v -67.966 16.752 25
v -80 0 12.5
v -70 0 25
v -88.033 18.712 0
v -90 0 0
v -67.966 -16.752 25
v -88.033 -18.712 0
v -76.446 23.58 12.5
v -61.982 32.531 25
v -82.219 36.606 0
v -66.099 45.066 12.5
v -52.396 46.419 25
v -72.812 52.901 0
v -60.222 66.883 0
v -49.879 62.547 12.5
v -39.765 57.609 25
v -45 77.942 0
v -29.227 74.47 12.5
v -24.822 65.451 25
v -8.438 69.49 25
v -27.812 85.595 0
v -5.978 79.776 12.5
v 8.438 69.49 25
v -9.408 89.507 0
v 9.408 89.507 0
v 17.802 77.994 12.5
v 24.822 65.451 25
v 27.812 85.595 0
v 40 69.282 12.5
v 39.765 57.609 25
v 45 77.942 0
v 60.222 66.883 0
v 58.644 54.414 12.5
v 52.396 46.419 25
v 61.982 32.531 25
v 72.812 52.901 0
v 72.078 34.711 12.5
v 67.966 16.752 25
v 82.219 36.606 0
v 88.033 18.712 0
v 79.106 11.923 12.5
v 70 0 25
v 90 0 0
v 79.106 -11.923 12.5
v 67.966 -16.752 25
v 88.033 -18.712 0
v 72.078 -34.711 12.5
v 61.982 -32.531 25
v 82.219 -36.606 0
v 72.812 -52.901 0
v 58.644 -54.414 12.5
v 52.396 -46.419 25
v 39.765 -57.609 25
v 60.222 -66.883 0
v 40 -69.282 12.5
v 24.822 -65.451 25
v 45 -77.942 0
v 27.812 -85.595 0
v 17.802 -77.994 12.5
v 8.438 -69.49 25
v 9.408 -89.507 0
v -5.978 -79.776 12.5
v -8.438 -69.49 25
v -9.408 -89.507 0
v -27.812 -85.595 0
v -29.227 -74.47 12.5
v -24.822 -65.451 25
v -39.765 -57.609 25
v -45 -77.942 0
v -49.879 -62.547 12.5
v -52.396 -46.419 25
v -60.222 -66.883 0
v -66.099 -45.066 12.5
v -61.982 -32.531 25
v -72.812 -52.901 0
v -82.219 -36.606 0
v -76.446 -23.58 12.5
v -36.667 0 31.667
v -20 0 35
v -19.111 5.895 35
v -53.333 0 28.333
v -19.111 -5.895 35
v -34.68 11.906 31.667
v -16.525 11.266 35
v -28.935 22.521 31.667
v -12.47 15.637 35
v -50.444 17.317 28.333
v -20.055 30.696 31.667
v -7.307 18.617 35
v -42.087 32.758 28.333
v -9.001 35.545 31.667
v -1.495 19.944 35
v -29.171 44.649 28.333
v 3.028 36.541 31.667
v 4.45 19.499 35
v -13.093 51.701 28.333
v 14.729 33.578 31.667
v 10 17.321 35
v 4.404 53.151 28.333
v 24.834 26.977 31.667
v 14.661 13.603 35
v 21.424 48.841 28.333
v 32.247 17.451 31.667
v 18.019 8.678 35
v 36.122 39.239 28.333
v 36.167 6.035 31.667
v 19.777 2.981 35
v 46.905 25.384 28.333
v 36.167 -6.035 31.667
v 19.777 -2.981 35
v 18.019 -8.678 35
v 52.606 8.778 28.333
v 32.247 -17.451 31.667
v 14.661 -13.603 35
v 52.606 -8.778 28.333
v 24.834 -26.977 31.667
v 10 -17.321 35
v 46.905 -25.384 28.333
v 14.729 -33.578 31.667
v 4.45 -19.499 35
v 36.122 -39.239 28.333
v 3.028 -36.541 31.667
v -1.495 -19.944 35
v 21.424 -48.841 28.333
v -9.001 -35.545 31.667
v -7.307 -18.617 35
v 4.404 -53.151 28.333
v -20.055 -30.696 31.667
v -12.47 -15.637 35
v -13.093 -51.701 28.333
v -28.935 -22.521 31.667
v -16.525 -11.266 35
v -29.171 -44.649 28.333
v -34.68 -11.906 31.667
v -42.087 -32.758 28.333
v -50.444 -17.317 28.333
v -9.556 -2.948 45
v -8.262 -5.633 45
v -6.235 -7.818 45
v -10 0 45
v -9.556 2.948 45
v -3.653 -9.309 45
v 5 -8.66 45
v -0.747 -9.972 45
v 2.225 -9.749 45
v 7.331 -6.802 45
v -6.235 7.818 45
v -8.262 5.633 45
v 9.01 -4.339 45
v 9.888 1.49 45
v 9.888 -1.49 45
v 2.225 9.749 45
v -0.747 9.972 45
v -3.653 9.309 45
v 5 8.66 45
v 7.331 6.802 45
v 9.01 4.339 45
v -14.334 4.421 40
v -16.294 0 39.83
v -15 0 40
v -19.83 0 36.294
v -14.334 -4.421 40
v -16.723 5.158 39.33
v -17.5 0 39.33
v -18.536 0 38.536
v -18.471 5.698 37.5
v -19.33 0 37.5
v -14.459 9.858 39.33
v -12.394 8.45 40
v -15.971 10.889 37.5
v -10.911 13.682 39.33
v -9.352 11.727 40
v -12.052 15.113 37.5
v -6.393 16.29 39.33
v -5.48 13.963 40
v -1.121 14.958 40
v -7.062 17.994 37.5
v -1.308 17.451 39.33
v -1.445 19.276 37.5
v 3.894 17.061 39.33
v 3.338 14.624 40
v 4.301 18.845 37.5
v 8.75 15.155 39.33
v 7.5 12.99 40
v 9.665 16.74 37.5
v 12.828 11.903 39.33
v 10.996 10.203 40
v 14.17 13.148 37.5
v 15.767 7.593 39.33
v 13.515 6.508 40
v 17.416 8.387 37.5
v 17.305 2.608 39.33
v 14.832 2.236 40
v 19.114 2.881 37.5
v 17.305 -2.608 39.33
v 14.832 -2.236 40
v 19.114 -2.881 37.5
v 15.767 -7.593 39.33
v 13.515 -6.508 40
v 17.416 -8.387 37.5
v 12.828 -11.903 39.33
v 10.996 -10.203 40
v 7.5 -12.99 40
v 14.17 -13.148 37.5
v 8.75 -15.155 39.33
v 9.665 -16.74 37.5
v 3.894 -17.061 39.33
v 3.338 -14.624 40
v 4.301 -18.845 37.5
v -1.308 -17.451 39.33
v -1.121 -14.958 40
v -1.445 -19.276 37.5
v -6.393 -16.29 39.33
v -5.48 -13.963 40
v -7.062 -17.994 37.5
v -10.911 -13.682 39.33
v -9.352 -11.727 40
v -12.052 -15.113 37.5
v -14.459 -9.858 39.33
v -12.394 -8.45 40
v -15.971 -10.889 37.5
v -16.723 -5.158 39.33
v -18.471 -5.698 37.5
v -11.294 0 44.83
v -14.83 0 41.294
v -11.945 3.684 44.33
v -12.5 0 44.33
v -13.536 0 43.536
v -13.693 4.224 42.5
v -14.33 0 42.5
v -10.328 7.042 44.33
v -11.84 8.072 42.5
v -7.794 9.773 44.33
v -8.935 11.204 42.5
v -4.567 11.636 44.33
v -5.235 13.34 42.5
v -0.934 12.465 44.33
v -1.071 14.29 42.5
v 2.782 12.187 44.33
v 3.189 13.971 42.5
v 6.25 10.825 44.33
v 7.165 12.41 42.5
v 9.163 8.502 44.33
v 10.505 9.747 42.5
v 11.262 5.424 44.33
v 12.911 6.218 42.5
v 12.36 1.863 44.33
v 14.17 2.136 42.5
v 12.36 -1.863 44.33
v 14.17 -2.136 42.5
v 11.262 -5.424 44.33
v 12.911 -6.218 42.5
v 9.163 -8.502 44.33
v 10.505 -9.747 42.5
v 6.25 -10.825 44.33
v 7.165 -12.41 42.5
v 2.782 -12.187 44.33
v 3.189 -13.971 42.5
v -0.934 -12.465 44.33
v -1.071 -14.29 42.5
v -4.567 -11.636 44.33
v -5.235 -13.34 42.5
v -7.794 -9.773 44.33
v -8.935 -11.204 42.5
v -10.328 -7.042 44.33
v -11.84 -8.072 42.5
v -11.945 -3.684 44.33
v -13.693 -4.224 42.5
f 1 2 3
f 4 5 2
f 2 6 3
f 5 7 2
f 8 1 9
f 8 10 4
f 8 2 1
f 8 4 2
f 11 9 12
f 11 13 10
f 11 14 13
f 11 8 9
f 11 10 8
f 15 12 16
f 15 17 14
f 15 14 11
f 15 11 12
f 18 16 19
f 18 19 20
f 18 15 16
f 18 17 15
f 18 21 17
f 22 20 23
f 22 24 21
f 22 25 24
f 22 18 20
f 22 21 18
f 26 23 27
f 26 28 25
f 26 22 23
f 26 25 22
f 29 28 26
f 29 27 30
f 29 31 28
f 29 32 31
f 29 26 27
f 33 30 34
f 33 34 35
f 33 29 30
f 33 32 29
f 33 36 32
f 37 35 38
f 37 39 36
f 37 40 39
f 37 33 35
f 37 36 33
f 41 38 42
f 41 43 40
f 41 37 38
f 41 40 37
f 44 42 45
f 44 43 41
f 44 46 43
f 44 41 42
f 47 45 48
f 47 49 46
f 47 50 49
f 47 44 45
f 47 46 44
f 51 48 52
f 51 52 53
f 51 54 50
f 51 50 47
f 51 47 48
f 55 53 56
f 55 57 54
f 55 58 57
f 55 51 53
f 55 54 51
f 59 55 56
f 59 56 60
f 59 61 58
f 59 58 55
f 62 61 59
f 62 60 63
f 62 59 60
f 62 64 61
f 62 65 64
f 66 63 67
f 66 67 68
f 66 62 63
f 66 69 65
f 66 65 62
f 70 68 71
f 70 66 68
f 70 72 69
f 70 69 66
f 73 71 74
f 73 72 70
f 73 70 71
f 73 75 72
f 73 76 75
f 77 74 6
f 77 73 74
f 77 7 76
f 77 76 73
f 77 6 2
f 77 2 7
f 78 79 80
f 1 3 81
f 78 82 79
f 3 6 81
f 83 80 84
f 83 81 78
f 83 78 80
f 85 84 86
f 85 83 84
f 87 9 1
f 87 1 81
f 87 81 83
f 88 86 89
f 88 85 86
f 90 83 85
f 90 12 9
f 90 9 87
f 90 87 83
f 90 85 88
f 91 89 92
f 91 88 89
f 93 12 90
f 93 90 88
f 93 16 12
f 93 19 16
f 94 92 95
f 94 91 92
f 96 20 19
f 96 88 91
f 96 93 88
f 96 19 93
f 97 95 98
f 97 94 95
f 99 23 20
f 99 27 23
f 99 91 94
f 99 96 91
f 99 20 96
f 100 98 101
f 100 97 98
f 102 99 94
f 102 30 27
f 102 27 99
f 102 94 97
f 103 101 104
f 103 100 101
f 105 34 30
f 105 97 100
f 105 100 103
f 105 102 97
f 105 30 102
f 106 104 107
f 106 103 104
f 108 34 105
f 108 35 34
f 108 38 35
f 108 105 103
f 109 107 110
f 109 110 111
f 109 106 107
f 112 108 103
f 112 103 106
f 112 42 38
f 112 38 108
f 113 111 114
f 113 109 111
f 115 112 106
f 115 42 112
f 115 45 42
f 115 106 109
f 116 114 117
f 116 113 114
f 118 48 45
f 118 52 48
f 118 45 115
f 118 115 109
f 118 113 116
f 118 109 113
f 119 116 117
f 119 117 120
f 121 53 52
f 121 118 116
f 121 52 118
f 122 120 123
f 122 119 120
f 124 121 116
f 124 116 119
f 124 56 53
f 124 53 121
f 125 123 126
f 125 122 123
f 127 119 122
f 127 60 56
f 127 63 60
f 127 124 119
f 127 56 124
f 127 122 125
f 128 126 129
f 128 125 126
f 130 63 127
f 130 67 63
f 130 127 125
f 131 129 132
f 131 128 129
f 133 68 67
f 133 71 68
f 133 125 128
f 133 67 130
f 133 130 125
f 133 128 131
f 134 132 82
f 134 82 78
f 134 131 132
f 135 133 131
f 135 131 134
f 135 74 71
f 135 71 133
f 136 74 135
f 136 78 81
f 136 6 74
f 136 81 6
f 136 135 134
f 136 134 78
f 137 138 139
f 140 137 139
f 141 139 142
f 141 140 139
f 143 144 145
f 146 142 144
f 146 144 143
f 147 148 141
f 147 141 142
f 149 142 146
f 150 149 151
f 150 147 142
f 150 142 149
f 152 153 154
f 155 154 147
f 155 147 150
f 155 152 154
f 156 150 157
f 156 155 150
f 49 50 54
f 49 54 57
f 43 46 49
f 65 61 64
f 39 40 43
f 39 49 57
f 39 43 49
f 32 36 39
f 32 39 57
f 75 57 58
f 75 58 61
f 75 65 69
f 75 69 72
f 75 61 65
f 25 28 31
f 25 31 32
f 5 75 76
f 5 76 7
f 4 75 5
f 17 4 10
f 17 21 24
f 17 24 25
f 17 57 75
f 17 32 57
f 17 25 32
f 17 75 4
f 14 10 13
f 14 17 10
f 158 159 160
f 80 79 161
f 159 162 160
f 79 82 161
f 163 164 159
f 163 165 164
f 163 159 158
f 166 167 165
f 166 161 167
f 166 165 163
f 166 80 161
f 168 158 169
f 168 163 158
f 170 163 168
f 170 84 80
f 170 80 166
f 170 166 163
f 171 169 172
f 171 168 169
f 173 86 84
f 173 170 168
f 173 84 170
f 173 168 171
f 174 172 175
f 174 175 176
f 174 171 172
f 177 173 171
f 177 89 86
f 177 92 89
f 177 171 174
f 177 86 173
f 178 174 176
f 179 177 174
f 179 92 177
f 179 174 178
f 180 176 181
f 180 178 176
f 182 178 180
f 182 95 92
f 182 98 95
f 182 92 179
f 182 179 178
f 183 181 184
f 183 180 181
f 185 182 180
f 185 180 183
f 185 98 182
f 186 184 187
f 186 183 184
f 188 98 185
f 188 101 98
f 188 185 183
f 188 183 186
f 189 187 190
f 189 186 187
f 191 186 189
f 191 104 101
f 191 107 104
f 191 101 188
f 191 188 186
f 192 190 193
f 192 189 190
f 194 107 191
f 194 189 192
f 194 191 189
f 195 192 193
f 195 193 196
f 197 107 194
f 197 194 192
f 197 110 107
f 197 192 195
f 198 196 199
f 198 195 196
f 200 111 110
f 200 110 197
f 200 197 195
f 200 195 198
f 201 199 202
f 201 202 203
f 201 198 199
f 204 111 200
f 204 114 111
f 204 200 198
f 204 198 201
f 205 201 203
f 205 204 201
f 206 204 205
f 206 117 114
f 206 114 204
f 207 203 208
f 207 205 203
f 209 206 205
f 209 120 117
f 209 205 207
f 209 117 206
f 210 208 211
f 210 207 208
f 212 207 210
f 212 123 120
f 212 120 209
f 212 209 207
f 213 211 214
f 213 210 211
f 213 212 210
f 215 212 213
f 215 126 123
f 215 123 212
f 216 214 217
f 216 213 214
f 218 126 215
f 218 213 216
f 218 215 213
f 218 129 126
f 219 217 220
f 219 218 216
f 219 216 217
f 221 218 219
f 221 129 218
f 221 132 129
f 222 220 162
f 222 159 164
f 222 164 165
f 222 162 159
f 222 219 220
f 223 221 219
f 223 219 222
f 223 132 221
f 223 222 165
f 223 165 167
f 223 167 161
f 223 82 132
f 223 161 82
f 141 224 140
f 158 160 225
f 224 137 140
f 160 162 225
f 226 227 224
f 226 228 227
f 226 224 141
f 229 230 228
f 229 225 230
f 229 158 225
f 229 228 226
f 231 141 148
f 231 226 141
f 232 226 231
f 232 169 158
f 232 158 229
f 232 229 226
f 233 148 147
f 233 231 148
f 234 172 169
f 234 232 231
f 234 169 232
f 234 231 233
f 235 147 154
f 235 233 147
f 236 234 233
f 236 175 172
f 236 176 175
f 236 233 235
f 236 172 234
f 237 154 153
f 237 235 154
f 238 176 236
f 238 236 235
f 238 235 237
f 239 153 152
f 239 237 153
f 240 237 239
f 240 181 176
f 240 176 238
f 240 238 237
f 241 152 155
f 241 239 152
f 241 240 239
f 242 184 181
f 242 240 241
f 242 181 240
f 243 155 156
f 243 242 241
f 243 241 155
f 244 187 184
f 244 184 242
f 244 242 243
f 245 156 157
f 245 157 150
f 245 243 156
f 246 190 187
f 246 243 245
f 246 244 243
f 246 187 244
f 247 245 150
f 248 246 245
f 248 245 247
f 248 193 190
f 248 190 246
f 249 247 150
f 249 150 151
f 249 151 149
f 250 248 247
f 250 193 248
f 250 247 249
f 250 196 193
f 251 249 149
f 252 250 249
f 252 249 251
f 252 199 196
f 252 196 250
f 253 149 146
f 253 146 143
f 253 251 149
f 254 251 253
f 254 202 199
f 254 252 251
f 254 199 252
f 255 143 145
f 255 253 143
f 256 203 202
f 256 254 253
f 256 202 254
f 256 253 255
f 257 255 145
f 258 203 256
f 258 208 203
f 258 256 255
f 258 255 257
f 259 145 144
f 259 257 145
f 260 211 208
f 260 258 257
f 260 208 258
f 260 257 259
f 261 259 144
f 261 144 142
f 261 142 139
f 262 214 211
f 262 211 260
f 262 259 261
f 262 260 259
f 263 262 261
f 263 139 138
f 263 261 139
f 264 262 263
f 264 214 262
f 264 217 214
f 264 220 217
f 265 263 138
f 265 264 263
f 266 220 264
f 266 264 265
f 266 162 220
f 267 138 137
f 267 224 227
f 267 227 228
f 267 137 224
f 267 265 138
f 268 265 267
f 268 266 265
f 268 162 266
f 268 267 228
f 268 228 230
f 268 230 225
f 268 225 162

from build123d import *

# Parameters (mm, degrees)
F2_R = 4.99999


# Not quite as in the source:
# - a fillet or chamfer is up to 0.001 mm smaller than in the source, because OpenCascade refuses the exact size


with BuildPart() as f1:
    # F0 (on Front) → F1 (revolve)
    with BuildSketch(Plane.XZ):
        Polygon((-70, 25), (-90, 0), (0, 0), (0, 45), (-15, 45), (-15, 40), (-20, 40), (-20, 35), align=None)
    revolve(axis=Axis((0, 0, 22.5), (0, 0, -1)))

    # F2 (radius 5 in the source; OpenCascade refuses exactly that, so slightly less here)
    f2_edges = [f1.edges().sort_by_distance(p)[0] for p in [
        (20, 0, 40),
        (15, 0, 45),
    ]]
    fillet(f2_edges, radius=F2_R)


solid = f1.part
